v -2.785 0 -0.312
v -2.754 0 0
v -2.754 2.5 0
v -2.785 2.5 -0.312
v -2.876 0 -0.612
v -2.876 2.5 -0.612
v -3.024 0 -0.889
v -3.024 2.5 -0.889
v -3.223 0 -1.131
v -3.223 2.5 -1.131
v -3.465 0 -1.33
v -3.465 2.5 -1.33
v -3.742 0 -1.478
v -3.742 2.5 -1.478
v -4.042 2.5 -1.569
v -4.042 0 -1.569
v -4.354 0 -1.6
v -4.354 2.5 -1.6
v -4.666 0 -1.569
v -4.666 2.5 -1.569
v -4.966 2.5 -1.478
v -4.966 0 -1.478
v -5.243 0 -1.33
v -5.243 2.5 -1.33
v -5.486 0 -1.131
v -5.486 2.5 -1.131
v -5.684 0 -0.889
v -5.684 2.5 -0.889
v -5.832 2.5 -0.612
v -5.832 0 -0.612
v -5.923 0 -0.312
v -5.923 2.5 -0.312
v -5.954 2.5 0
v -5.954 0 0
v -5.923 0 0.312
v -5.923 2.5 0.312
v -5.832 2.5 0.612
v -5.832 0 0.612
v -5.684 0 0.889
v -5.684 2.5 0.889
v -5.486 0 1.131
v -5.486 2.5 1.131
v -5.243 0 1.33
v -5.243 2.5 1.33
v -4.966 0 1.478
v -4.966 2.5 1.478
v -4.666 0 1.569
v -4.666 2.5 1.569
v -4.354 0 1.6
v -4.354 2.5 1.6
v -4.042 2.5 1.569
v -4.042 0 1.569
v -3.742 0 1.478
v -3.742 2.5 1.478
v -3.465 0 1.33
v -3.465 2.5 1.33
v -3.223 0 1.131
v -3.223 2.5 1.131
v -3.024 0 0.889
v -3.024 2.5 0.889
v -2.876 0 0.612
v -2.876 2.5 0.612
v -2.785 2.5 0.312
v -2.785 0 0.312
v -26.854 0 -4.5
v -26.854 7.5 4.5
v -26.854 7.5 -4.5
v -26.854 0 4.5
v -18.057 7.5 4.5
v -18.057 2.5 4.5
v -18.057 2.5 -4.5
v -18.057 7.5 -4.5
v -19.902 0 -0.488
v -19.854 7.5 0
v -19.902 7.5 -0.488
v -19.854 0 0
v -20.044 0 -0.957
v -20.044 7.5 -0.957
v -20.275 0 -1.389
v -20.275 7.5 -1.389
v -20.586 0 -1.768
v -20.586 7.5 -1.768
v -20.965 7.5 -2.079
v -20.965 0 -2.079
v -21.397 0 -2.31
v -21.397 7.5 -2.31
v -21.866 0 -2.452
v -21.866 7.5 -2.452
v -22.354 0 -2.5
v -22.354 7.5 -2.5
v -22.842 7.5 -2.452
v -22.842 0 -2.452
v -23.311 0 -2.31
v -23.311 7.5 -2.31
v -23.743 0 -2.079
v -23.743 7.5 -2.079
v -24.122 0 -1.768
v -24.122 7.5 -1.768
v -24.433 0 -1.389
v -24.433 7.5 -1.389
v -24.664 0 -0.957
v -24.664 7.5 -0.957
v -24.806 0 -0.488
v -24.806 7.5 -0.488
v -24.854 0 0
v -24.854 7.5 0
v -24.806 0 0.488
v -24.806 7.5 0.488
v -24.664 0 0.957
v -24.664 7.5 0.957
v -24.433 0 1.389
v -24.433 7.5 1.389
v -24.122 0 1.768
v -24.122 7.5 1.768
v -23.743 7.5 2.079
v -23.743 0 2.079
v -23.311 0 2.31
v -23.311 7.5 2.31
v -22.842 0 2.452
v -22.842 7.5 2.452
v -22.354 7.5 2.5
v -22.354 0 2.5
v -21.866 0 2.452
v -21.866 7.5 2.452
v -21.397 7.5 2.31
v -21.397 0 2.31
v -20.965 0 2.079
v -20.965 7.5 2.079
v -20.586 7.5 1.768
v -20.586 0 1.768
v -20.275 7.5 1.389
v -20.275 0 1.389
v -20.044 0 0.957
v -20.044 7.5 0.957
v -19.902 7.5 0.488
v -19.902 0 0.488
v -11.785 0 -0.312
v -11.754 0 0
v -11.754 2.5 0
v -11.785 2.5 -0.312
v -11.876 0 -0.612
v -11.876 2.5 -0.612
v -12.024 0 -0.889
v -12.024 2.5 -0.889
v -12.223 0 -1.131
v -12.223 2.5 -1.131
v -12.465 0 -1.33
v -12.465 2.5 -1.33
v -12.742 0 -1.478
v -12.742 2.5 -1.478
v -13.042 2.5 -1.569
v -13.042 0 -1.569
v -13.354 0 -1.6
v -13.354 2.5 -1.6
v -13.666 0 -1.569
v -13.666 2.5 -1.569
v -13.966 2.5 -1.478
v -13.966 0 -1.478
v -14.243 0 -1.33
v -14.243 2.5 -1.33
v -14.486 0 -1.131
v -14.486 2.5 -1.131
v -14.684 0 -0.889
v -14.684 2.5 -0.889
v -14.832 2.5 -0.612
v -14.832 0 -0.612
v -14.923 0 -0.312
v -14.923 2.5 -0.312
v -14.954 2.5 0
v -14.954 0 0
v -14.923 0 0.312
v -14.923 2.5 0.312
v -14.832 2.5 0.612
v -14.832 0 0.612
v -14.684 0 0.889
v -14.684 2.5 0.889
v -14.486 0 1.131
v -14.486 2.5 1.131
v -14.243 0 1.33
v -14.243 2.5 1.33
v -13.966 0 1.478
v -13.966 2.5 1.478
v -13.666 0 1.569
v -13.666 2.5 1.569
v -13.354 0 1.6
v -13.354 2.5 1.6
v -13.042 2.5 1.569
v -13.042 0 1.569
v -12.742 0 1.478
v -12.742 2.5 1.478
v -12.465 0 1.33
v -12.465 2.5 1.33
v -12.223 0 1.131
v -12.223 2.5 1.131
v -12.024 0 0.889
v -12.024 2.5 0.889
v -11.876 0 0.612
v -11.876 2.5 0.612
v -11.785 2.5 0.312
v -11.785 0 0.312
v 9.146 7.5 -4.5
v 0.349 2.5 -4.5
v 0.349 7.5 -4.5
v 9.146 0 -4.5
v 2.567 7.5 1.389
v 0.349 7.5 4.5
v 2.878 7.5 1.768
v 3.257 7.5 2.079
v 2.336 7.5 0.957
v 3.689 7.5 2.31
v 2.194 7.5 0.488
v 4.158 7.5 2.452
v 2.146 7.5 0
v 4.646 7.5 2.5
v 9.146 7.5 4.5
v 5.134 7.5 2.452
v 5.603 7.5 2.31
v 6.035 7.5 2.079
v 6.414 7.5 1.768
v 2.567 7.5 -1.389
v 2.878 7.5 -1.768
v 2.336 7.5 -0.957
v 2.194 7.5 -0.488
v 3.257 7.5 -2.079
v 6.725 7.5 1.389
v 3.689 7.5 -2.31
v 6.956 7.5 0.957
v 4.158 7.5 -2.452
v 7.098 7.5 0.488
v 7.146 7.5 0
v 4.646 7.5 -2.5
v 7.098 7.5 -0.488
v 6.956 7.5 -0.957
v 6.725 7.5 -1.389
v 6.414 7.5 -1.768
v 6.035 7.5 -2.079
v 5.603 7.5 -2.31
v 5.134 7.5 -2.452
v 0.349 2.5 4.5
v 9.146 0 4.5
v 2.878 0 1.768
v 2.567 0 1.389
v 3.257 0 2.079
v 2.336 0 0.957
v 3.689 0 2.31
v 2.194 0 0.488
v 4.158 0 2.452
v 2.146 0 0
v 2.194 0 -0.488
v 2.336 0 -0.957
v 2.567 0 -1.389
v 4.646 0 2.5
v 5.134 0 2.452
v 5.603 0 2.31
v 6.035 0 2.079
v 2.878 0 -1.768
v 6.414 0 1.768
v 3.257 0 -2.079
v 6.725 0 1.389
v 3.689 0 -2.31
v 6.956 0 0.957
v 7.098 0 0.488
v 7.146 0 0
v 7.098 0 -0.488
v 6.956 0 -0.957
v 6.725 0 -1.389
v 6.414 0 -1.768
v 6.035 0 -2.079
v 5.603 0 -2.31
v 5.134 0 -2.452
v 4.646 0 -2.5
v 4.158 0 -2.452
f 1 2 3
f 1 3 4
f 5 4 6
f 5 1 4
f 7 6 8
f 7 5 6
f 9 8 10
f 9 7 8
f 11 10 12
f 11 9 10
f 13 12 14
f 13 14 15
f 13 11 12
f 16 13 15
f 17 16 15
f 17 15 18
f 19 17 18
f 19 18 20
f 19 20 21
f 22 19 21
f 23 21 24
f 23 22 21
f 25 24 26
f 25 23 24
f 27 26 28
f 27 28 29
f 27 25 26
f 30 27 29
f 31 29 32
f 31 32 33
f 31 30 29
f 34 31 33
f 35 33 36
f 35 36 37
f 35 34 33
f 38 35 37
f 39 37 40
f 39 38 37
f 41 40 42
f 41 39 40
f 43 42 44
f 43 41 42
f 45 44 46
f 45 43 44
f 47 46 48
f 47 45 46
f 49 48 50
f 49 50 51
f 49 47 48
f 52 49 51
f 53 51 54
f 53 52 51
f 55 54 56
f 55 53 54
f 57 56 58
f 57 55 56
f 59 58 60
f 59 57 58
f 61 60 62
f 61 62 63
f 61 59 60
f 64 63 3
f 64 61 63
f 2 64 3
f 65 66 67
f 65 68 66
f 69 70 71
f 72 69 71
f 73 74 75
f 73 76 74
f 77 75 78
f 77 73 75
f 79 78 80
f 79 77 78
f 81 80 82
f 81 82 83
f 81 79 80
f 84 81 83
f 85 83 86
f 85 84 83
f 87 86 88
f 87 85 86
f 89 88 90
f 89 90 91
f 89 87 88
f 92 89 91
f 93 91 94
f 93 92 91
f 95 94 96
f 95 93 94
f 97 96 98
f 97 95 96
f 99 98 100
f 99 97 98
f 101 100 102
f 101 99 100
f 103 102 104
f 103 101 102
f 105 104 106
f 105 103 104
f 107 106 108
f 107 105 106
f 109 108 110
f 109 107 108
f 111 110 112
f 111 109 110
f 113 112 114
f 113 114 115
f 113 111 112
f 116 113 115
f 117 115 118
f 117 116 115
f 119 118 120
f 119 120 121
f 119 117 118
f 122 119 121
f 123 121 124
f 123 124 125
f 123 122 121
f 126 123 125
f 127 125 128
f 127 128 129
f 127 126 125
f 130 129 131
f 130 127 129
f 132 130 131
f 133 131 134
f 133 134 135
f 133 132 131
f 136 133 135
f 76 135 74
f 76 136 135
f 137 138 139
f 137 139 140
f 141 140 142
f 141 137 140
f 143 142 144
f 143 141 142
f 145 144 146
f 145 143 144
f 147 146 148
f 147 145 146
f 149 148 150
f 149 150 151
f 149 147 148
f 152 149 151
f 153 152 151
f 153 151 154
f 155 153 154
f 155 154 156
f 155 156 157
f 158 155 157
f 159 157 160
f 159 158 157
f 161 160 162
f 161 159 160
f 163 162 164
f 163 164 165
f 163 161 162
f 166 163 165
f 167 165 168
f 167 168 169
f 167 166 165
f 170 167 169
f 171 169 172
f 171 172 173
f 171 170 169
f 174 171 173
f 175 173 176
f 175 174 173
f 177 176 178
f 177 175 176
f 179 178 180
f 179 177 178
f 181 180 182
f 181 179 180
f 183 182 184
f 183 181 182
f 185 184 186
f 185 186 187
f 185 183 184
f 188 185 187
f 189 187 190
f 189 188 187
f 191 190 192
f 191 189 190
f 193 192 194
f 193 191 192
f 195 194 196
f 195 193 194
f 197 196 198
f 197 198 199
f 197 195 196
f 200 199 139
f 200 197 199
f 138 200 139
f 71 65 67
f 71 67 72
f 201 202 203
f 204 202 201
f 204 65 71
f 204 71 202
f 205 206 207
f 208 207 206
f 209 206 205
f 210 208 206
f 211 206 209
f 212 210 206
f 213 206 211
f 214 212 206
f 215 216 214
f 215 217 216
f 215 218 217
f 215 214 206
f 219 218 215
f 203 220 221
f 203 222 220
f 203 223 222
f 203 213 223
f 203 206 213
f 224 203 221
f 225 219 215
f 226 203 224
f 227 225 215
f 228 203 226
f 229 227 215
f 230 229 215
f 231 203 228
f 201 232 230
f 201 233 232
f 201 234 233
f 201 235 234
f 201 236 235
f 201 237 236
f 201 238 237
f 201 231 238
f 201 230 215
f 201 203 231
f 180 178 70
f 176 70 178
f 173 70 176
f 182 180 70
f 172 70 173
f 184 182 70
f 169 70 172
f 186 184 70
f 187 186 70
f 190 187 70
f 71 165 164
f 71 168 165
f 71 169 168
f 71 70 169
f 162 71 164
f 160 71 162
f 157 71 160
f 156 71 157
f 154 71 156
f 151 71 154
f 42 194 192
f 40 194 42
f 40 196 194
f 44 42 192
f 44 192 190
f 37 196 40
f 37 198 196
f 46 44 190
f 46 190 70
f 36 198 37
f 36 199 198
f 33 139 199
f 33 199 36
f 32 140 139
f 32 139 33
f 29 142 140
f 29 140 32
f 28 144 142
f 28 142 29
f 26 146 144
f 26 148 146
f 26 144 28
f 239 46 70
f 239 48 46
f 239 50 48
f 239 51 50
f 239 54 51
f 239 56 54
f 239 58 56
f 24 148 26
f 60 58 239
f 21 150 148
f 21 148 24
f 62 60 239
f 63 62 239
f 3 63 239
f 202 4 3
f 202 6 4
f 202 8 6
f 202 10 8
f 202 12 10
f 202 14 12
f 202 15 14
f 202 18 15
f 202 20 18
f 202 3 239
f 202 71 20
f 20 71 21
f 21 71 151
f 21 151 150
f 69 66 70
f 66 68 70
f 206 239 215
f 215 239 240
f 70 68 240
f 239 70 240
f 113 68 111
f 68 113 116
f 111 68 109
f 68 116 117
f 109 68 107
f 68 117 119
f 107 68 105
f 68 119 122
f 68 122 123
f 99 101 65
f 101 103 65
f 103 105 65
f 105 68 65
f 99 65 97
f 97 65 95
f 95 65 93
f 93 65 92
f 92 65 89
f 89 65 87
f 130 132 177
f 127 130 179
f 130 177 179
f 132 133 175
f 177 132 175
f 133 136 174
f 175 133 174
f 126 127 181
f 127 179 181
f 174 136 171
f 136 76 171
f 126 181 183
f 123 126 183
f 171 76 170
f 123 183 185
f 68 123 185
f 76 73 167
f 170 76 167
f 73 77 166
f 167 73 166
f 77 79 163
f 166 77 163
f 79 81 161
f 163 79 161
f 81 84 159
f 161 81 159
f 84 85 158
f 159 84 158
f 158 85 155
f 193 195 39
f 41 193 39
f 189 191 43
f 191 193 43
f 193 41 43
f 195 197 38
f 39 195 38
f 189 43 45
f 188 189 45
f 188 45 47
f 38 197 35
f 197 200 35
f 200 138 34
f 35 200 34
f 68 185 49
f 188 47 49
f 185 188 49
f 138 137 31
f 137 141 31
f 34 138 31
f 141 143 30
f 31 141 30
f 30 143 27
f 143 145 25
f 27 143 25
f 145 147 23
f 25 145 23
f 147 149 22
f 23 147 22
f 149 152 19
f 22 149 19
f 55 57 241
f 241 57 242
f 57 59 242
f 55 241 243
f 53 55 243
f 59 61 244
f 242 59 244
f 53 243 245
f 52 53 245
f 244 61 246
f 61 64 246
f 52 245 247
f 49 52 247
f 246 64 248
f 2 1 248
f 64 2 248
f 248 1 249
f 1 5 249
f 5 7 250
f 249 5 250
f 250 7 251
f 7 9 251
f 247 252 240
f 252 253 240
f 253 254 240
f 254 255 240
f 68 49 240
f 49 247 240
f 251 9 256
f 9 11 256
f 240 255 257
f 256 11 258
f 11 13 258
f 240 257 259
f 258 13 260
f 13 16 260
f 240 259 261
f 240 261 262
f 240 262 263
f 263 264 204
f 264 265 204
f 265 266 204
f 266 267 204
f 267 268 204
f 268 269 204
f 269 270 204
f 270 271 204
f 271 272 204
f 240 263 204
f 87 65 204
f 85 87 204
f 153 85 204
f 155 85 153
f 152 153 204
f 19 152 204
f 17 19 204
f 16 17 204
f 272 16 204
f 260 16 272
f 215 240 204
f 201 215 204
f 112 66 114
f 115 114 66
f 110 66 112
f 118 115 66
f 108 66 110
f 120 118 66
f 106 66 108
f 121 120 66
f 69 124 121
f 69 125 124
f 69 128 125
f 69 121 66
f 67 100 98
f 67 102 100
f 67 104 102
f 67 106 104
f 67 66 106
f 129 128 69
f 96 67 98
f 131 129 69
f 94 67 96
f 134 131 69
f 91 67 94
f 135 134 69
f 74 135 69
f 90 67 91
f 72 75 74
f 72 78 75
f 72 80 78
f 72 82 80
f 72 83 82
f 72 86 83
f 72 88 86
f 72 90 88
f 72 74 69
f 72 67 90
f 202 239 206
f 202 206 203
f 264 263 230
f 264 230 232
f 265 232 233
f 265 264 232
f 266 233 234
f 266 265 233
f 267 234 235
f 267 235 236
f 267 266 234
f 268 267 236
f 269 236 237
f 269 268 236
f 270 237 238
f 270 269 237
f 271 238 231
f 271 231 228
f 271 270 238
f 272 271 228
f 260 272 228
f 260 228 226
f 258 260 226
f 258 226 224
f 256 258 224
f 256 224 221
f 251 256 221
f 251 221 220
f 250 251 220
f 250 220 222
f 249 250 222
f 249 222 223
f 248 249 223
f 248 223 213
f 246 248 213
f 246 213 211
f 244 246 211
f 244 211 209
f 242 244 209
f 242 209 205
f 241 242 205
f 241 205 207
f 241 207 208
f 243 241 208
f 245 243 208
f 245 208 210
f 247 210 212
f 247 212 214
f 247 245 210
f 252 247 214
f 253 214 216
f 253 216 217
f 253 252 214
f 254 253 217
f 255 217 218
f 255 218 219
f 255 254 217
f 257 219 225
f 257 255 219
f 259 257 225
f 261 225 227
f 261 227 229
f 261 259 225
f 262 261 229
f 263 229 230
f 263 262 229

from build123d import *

# Parameters (mm, degrees)
SKETCH1_W           = 36
SKETCH1_H           = 9
SKETCH1_R           = 1.6
SKETCH1_R_2         = 2.5
BOSS_EXTRUDE1_DEPTH = 2.5
SKETCH2_W           = 8.796746506
SKETCH2_H           = 9
SKETCH2_R           = 2.5
BOSS_EXTRUDE2_DEPTH = 5


with BuildPart() as part:
    # Sketch1 → Boss-Extrude1 (new body)
    with BuildSketch(Plane(origin=(0, 0, 0), x_dir=(1, 0, 0), z_dir=(0, 1, 0))):
        with Locations((-8.854143772, 0)):
            Rectangle(SKETCH1_W, SKETCH1_H)
        with Locations((-13.354143772, 0)):
            Circle(SKETCH1_R, mode=Mode.SUBTRACT)
        with Locations((-4.354143772, 0)):
            Circle(SKETCH1_R, mode=Mode.SUBTRACT)
        with Locations((4.645856228, 0)):
            Circle(SKETCH1_R_2, mode=Mode.SUBTRACT)
        with Locations((-22.354143772, 0)):
            Circle(SKETCH1_R_2, mode=Mode.SUBTRACT)
    extrude(amount=BOSS_EXTRUDE1_DEPTH)

    # Sketch2 → Boss-Extrude2 (add)
    with BuildSketch(Plane(origin=(0, 2.5, 0), x_dir=(1, 0, 0), z_dir=(0, 1, 0))):
        with Locations((-22.455770519, 0)):
            Rectangle(SKETCH2_W, SKETCH2_H)
        with Locations((-22.354143772, 0)):
            Circle(SKETCH2_R, mode=Mode.SUBTRACT)
        with Locations((4.747482975, 0)):
            Rectangle(SKETCH2_W, SKETCH2_H)
        with Locations((4.645856228, 0)):
            Circle(SKETCH2_R, mode=Mode.SUBTRACT)
    extrude(amount=BOSS_EXTRUDE2_DEPTH)


solid = part.part
